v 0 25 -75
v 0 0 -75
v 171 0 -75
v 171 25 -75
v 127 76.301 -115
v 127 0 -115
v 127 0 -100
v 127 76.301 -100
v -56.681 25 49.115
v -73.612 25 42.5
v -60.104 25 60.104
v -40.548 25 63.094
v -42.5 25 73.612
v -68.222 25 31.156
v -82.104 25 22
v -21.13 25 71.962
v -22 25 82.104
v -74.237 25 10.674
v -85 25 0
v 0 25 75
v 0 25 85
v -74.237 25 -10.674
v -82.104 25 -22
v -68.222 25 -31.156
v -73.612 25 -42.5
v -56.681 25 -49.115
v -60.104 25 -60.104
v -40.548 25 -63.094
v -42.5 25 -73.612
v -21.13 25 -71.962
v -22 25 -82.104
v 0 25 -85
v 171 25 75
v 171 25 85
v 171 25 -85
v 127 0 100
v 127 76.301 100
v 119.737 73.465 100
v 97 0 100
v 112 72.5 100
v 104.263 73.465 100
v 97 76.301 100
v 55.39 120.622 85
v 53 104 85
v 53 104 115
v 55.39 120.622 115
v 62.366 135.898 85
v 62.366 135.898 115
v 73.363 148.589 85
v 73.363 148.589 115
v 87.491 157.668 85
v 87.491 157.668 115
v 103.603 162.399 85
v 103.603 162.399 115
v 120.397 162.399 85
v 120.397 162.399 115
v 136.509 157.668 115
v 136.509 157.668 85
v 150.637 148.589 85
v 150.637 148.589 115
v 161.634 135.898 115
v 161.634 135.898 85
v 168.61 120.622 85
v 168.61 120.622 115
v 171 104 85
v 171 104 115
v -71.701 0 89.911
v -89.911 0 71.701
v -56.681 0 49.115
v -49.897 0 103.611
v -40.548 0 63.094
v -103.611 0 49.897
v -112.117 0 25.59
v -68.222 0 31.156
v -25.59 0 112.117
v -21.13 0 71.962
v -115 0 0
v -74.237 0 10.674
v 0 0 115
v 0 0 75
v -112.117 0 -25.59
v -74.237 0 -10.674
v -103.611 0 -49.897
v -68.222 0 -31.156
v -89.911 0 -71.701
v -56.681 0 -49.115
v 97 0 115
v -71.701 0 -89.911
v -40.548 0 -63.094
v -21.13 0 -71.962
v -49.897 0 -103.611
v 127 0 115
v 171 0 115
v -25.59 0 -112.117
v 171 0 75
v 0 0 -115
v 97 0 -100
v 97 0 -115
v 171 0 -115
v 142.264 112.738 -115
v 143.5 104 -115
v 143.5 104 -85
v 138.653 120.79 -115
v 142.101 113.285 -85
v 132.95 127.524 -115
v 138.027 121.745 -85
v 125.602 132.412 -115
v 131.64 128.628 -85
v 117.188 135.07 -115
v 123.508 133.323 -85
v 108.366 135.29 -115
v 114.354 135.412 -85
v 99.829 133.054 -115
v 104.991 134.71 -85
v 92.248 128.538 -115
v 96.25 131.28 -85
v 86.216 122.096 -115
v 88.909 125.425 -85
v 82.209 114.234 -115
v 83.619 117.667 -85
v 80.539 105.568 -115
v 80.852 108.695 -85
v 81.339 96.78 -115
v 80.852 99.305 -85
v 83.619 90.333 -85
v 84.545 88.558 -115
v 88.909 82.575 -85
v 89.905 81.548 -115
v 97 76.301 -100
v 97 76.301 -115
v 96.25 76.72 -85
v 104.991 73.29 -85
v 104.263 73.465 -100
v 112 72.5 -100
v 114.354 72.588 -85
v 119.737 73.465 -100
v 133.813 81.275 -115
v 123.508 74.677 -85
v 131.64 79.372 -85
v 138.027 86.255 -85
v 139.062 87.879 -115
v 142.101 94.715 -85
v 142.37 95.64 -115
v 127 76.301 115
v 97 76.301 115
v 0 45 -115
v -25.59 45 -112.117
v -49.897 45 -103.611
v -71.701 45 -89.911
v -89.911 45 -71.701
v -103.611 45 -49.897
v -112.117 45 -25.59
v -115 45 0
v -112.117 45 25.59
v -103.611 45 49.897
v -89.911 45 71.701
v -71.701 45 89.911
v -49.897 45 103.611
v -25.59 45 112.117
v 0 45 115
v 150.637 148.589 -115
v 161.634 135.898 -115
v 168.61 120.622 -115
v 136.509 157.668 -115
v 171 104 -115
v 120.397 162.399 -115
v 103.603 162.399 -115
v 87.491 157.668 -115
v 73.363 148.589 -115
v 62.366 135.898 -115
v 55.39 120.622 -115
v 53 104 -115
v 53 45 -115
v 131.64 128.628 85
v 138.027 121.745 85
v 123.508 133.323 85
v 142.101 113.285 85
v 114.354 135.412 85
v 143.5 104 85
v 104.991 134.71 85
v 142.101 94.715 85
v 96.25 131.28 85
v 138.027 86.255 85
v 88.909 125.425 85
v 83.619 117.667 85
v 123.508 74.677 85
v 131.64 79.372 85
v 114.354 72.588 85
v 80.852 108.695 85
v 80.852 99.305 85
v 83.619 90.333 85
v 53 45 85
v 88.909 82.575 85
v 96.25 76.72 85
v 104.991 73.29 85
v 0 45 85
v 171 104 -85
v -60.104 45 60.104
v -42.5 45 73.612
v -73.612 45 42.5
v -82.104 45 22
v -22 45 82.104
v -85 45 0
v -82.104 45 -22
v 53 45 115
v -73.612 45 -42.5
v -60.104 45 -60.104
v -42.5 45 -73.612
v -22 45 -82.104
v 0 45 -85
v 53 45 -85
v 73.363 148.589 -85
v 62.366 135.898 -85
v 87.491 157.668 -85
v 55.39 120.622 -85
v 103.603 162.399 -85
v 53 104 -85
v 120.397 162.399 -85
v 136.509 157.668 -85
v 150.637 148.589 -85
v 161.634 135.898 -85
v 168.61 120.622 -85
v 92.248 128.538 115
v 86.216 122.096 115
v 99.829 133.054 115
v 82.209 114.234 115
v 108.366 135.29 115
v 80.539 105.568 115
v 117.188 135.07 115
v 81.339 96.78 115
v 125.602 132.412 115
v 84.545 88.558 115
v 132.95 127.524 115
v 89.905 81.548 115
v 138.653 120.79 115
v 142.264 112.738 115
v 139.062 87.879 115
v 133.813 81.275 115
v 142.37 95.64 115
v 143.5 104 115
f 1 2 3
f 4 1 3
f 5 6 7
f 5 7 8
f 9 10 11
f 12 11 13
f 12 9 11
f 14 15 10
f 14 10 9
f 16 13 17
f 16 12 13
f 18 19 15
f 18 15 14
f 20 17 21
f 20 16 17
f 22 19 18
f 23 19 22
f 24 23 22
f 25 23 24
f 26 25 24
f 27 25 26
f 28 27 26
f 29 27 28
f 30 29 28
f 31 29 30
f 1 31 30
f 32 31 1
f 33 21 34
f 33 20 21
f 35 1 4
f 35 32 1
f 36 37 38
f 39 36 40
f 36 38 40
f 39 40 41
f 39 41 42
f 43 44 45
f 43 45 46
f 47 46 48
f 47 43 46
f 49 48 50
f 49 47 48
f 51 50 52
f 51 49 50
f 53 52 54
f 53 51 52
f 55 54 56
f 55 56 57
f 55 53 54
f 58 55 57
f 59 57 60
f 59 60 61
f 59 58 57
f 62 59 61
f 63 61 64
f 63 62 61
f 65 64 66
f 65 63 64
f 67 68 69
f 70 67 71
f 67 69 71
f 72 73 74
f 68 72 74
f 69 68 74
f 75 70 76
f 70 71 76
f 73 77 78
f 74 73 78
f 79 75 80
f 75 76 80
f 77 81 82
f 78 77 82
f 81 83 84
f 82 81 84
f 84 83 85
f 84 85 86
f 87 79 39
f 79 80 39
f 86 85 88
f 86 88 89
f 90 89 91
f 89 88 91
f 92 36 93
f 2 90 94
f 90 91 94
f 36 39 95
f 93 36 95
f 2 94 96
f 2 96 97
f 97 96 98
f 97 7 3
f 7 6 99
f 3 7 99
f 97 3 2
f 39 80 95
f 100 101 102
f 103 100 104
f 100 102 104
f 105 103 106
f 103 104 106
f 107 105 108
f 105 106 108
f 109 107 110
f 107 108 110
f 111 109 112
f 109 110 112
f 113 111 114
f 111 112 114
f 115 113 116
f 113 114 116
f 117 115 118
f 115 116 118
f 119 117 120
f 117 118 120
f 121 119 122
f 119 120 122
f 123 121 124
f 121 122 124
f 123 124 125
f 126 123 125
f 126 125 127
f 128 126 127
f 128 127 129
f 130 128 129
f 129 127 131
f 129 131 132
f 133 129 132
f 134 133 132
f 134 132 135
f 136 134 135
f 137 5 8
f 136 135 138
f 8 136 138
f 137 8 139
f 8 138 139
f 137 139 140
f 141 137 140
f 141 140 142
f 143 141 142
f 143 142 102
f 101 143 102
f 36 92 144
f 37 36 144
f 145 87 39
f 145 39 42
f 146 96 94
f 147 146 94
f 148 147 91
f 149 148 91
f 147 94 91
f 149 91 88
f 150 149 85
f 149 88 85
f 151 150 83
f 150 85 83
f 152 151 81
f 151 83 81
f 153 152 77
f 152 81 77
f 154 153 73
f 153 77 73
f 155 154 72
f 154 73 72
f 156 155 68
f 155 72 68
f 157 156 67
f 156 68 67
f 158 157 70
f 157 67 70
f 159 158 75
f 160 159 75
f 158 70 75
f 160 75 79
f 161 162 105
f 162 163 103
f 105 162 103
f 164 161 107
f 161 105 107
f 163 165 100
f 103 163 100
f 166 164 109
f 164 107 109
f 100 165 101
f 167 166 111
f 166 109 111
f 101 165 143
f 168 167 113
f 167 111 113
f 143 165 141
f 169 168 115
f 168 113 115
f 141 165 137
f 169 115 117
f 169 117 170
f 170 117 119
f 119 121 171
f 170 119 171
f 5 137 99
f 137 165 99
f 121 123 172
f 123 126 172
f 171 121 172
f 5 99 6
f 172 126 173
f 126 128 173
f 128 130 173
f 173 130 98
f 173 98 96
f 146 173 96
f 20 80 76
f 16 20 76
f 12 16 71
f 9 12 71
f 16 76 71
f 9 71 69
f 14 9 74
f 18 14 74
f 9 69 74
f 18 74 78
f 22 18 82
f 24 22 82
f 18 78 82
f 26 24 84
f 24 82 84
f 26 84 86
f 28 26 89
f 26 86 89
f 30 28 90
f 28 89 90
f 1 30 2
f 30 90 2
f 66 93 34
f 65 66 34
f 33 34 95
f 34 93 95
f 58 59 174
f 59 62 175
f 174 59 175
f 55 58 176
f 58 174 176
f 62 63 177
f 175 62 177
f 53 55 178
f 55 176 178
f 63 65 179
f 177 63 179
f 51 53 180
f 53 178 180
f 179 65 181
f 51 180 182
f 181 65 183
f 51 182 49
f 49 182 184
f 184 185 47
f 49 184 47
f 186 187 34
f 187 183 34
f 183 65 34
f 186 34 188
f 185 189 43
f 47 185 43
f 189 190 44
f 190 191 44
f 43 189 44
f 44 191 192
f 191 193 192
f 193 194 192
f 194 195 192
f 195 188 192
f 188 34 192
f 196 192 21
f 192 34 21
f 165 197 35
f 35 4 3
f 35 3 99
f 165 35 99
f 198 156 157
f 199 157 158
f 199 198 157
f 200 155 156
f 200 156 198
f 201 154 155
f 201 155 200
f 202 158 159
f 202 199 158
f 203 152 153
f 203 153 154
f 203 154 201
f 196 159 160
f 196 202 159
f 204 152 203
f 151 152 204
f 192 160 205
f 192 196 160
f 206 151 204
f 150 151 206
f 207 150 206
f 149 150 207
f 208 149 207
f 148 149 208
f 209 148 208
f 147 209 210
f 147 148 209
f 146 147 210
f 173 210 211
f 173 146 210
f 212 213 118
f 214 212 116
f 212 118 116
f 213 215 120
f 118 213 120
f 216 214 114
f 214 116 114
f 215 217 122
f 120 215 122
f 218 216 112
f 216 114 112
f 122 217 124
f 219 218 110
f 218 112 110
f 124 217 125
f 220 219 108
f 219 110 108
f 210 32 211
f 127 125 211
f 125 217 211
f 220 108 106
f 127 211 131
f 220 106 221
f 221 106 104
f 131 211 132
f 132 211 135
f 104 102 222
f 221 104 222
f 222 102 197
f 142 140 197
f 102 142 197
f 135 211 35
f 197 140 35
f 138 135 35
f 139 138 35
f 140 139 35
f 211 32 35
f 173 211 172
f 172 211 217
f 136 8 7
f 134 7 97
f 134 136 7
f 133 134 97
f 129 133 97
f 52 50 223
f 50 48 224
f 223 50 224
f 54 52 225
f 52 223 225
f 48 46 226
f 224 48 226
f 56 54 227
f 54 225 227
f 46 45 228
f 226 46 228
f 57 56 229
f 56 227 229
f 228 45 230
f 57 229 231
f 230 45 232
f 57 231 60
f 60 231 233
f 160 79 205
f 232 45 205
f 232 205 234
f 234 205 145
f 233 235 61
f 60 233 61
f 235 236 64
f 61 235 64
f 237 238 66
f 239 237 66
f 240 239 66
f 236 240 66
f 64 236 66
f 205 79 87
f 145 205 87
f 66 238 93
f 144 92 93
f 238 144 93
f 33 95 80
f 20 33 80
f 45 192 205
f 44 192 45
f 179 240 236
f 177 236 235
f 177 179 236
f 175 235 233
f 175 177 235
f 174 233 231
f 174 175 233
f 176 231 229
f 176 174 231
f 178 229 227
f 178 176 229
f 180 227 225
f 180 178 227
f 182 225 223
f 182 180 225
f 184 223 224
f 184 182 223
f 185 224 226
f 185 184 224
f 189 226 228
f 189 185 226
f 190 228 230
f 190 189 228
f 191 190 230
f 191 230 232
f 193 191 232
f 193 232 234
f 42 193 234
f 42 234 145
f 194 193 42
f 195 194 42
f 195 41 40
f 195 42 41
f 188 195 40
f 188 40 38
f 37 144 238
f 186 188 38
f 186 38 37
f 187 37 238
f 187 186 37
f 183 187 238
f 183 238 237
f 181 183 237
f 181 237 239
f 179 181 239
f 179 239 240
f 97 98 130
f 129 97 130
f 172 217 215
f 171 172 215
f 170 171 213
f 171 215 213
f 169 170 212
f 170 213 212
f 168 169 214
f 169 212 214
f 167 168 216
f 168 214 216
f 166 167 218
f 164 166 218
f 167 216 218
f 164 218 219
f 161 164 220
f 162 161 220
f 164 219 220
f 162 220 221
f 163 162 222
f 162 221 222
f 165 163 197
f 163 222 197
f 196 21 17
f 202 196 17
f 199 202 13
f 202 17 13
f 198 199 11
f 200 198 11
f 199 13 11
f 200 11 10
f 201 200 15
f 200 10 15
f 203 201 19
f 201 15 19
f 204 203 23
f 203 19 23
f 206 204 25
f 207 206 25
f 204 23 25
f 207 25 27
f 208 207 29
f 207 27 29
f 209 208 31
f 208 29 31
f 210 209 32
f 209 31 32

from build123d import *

# Parameters (mm, degrees)
EXTRUDE_2_DEPTH     = 25
EXTRUDE_3_DEPTH     = 45
SKETCH_2_R          = 31.5
EXTRUDE_4_DEPTH     = 30
SKETCH_3_W          = 30
SKETCH_3_H          = 172.84779514
CUT_EXTRUDE_1_DEPTH = 15


with BuildPart() as part:
    # 草图1 → 凸台-拉伸2 (new body)
    with BuildSketch(Plane(origin=(0, 0, 0), x_dir=(1, 0, 0), z_dir=(0, 1, 0))):
        with BuildLine():
            Line((171, -115), (171, -75))
            Line((171, -75), (0, -75))
            ThreePointArc((0, -75), (-75, 0), (0, 75))
            Line((0, 75), (171, 75))
            Line((171, 75), (171, 115))
            Line((171, 115), (0, 115))
            ThreePointArc((0, 115), (-115, 0), (0, -115))
            Line((0, -115), (171, -115))
        make_face()
    extrude(amount=EXTRUDE_2_DEPTH)

    # 草图1<5> → 凸台-拉伸3 (add)
    with BuildSketch(Plane(origin=(0, 0, 0), x_dir=(1, 0, 0), z_dir=(0, 1, 0))):
        with BuildLine():
            ThreePointArc((0, -85), (-85, 0), (0, 85))
            Line((0, 85), (171, 85))
            Line((171, 85), (171, 115))
            Line((171, 115), (0, 115))
            ThreePointArc((0, 115), (-115, 0), (0, -115))
            Line((0, -115), (171, -115))
            Line((171, -115), (171, -85))
            Line((171, -85), (0, -85))
        make_face()
    extrude(amount=EXTRUDE_3_DEPTH)

    # 草图2 → 凸台-拉伸4 (add)
    with BuildSketch(Plane.XY.offset(-85)):
        with BuildLine():
            Line((171, 25), (53, 25))
            Line((53, 25), (53, 104))
            ThreePointArc((53, 104), (112, 163), (171, 104))
            Line((171, 104), (171, 25))
        make_face()
        with Locations((112, 104)):
            Circle(SKETCH_2_R, mode=Mode.SUBTRACT)
    extrude_4 = extrude(amount=-EXTRUDE_4_DEPTH)

    # 草图3 → 切除-拉伸1 (cut)
    with BuildSketch(Plane(origin=(0, 0, -115), x_dir=(-1, 0, 0), z_dir=(0, 0, -1))):
        with Locations((-112, 0)):
            Rectangle(SKETCH_3_W, SKETCH_3_H)
    cut_extrude_1 = extrude(amount=-CUT_EXTRUDE_1_DEPTH, mode=Mode.SUBTRACT)

    # 镜向4: 凸台-拉伸4, 切除-拉伸1 across plane
    add(extrude_4.mirror(Plane.XY))
    add(cut_extrude_1.mirror(Plane.XY), mode=Mode.SUBTRACT)


solid = part.part
